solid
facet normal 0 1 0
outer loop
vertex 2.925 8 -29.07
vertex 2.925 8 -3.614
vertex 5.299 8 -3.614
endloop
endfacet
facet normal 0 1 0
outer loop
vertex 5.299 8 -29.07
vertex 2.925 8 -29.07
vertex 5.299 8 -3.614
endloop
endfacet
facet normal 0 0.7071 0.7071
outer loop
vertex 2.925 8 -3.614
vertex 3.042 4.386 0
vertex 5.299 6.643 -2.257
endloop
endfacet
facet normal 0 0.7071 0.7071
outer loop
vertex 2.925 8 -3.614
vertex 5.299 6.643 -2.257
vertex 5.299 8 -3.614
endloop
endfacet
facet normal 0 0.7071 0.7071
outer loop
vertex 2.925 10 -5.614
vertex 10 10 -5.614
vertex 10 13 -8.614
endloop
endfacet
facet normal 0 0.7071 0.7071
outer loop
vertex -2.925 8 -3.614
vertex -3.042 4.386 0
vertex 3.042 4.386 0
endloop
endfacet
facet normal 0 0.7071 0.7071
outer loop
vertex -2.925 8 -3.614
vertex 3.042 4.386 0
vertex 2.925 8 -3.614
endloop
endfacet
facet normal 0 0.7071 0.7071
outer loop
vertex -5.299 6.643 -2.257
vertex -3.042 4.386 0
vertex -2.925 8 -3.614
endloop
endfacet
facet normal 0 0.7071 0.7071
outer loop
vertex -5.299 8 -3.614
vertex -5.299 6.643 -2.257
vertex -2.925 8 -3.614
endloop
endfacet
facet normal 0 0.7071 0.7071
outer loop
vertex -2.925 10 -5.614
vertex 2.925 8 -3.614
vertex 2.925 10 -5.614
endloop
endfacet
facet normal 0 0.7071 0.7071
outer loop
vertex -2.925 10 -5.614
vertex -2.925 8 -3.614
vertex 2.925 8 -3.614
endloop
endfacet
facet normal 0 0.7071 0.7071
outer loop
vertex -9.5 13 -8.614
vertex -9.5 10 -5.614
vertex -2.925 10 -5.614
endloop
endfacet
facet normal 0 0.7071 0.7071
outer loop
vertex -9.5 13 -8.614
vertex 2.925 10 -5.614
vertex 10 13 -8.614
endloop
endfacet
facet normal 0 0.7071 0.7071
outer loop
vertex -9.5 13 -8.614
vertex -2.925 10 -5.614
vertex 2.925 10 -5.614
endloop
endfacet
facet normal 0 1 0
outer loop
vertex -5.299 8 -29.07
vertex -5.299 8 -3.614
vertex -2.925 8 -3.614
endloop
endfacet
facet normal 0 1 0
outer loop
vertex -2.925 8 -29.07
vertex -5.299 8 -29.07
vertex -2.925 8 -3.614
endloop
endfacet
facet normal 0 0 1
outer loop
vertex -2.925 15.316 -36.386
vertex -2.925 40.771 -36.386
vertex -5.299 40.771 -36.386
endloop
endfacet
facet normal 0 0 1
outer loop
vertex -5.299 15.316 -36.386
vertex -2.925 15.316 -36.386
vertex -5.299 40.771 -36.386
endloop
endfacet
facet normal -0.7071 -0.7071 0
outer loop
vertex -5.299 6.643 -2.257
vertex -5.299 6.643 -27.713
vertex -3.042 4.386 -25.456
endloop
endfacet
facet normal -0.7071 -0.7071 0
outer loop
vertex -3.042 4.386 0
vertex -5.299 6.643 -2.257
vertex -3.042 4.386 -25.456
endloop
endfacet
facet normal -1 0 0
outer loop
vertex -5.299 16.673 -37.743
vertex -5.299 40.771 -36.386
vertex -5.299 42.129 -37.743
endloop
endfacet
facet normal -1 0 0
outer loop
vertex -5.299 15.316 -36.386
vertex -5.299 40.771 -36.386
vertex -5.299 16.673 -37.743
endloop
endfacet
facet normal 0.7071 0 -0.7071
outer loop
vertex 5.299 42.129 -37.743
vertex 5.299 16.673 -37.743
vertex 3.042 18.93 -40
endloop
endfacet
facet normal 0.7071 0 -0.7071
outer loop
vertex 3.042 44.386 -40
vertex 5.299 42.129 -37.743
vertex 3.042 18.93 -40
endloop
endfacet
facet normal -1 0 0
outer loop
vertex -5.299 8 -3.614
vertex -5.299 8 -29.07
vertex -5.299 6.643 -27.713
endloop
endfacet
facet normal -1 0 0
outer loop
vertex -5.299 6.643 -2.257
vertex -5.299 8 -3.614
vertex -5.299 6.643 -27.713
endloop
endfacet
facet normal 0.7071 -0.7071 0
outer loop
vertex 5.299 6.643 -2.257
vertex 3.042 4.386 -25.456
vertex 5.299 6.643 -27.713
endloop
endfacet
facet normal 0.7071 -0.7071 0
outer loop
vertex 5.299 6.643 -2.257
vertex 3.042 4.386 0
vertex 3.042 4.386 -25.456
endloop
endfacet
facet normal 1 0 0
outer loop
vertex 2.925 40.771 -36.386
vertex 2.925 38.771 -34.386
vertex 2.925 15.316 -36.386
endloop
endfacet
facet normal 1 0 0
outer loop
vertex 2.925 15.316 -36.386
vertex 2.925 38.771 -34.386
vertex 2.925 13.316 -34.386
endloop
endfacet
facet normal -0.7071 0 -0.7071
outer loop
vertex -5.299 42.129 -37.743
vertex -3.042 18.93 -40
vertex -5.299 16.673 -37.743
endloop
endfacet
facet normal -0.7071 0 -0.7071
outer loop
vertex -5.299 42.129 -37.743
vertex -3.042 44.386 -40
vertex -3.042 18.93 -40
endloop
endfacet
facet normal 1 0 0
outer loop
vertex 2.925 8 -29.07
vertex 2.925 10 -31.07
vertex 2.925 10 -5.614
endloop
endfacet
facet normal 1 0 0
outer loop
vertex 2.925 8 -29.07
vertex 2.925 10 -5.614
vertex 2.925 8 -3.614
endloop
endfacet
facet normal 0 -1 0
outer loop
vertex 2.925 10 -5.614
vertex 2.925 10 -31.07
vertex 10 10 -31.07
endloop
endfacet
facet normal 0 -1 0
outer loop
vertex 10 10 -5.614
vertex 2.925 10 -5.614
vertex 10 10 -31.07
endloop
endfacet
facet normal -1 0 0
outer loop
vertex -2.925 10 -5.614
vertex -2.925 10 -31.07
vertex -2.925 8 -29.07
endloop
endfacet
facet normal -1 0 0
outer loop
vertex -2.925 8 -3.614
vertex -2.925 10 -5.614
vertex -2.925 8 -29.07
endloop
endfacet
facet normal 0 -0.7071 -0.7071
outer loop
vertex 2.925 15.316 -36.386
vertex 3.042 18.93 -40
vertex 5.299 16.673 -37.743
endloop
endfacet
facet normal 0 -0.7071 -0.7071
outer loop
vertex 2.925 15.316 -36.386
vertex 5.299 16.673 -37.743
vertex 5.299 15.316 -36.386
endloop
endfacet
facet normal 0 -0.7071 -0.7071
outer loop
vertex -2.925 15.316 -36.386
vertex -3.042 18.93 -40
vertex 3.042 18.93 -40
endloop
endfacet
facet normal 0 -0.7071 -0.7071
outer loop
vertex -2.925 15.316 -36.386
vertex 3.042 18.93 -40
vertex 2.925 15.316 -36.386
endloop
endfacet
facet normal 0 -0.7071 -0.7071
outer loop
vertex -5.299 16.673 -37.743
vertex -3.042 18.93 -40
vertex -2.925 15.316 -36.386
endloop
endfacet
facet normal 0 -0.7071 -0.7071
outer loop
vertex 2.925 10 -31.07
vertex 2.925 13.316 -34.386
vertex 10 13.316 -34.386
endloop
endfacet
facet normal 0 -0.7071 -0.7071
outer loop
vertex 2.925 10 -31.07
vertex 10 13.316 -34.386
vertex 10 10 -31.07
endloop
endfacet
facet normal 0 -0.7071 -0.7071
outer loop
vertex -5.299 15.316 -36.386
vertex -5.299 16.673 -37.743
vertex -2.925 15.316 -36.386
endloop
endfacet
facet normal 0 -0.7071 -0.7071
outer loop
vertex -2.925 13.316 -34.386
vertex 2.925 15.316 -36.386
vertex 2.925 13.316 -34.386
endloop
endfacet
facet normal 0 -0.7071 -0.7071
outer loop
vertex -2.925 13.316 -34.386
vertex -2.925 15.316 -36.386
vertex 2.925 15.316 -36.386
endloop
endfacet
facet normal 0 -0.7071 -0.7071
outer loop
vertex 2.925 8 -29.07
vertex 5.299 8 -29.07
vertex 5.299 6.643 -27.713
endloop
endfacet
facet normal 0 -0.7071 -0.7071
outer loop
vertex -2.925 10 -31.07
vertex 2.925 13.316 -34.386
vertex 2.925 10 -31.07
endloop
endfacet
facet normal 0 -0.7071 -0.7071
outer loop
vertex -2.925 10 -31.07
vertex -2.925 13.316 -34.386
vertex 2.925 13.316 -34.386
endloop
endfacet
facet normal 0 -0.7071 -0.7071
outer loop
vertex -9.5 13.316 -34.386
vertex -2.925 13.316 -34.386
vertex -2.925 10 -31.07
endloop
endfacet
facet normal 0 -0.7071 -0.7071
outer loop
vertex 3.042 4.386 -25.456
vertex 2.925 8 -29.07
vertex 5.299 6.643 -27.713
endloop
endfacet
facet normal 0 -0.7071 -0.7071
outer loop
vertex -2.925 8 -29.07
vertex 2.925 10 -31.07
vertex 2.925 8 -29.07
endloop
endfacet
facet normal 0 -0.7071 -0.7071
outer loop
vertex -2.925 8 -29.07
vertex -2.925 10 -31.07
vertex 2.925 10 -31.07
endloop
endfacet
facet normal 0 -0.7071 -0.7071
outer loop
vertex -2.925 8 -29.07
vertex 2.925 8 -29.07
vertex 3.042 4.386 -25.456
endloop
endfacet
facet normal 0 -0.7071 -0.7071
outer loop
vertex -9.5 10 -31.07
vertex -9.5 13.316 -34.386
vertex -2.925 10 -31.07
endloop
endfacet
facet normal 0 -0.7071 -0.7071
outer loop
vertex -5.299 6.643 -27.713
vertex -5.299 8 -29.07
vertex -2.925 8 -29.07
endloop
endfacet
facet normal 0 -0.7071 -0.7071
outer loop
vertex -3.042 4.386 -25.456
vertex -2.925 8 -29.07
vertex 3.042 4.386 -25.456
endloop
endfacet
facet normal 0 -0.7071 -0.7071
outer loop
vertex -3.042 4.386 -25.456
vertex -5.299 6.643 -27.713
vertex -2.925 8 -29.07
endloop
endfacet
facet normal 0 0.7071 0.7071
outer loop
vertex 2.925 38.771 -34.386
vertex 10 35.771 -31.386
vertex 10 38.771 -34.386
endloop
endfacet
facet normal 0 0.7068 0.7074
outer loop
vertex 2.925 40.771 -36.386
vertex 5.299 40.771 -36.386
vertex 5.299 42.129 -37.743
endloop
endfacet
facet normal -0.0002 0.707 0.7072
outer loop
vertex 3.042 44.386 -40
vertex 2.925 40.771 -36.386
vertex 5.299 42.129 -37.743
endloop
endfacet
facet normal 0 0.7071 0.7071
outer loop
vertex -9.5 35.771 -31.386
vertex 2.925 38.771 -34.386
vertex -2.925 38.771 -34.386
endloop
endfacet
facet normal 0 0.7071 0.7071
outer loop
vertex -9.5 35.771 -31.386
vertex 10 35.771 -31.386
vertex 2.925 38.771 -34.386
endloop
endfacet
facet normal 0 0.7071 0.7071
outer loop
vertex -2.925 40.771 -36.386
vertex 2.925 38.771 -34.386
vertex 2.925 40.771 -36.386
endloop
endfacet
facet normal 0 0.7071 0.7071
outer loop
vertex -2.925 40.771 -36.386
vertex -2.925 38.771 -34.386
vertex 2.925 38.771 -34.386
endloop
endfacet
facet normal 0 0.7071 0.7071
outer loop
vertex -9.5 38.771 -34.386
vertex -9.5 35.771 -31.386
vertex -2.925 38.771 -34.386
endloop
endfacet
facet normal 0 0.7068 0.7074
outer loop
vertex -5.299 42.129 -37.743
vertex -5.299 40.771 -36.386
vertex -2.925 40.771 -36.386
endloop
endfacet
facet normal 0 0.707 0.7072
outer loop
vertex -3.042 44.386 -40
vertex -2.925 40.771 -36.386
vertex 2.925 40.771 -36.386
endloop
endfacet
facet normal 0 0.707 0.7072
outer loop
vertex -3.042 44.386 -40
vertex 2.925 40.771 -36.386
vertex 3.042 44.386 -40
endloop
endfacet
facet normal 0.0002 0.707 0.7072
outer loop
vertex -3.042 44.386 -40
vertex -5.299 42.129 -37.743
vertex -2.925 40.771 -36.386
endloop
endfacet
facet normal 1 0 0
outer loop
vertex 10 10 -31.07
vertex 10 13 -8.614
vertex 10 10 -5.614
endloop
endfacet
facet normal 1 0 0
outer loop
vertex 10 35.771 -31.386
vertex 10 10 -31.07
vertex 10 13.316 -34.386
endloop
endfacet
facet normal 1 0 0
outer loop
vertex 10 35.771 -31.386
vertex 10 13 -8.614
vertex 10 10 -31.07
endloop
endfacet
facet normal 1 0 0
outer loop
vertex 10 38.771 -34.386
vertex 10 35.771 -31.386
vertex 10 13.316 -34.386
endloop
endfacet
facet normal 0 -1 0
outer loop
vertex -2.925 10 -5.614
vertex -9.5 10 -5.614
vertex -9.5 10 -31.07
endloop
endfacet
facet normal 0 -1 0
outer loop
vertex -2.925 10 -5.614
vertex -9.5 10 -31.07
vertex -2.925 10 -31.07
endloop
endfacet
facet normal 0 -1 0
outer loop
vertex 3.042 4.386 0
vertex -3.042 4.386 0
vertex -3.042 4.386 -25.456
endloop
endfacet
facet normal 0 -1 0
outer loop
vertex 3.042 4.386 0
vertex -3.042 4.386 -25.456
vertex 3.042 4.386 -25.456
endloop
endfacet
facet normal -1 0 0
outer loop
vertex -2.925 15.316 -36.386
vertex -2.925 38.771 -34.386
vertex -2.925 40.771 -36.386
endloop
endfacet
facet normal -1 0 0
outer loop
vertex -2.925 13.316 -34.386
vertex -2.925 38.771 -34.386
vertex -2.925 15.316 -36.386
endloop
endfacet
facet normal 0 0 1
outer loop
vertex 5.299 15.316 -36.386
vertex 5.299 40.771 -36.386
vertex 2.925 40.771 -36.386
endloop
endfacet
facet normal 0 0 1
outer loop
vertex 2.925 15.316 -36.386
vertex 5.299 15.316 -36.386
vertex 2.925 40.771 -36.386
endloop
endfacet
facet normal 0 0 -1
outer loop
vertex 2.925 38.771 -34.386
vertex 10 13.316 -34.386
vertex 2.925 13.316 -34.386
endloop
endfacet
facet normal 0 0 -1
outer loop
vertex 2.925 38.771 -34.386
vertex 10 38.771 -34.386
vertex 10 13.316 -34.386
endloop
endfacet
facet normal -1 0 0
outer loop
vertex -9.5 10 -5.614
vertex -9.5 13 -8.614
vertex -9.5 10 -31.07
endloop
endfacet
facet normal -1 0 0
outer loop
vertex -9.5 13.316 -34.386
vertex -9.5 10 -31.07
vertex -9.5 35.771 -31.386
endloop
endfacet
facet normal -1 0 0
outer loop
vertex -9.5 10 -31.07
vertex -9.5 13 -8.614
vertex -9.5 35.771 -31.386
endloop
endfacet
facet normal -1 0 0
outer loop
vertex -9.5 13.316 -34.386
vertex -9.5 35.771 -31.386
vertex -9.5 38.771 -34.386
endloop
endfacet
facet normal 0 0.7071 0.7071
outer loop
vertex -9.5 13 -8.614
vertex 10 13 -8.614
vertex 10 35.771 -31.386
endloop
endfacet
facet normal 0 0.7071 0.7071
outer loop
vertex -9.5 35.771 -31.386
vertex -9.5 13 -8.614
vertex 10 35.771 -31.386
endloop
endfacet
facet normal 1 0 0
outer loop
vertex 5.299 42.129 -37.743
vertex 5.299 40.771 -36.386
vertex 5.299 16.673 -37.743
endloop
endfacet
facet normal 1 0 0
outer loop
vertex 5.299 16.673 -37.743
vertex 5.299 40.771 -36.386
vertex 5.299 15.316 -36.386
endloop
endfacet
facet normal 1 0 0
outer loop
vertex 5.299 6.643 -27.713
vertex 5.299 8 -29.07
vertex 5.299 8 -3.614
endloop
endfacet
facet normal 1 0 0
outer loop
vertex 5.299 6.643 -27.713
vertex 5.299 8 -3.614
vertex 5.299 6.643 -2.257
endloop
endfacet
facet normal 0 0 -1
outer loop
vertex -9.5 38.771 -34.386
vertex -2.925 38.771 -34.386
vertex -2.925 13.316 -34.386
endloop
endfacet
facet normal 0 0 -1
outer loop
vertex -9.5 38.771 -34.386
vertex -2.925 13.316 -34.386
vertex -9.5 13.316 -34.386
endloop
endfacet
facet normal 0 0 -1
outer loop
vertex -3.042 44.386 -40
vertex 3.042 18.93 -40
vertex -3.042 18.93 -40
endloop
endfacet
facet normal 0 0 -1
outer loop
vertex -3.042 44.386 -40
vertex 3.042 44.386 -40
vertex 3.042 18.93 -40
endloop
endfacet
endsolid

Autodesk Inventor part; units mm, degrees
sketch "Szkic2" plane through (0, 0, 0) normal (0, 0, 1) x (1, 0, 0)
  circle A0 centre (0, 0) radius 2.1
  line L0 (-10, 10) -> (10, 10)
  line L1 (10, 10) -> (10, -10)
  line L2 (10, -10) -> (-10, -10)
  line L3 (-10, -10) -> (-10, 10)
  line L4 (-10, -10) -> (10, 10) construction
  line L5 (10, -10) -> (-10, 10) construction
  line L6 (-10, 8.2) -> (10, 8.2)
  line L7 (-10, -8.2) -> (10, -8.2)
  line L8 (-8.2, 10) -> (-8.2, -10)
  line L9 (10, 10) -> (30, 10)
  line L10 (30, 10) -> (30, -10)
  line L11 (30, -10) -> (10, -10)
  line L12 (10, -10) -> (10, 10)
  line L13 (-4.1857, -4.1857) -> (4.1857, -4.1857)
  line L14 (4.1857, -4.1857) -> (4.1857, 4.1857)
  line L15 (4.1857, 4.1857) -> (-4.1857, 4.1857)
  line L16 (-4.1857, 4.1857) -> (-4.1857, -4.1857)
  line L17 (-8.2, 7.1393) -> (-4.1857, 3.125)
  line L18 (-7.1393, 8.2) -> (-3.125, 4.1857)
  line L19 (-4.925, 10) -> (-3.125, 8.2)
  line L20 (4.925, 10) -> (3.125, 8.2)
  line L21 (-3.125, -8.2) -> (-4.925, -10)
  line L22 (3.125, -8.2) -> (4.925, -10)
  line L23 (-8.2, -7.1393) -> (-4.1857, -3.125)
  line L24 (-7.1393, -8.2) -> (-3.125, -4.1857)
  line L25 (3.125, -4.1857) -> (7.1393, -8.2)
  line L26 (4.1857, -3.125) -> (7.3007, -6.24)
  line L27 (4.1857, 3.125) -> (7.3007, 6.24)
  line L28 (3.125, 4.1857) -> (7.1393, 8.2)
  line L29 (-5.4993, 8.2) -> (-5.4993, 6.56)
  line L30 (5.4993, 8.2) -> (5.4993, 6.56)
  line L31 (-8.2, 5.4993) -> (-6.56, 5.4993)
  line L32 (-8.2, -5.4993) -> (-6.56, -5.4993)
  line L33 (-5.4993, -6.56) -> (-5.4993, -8.2)
  line L34 (5.4993, -6.56) -> (5.4993, -8.2)
  line L35 (-8.2, 3.125) -> (-10, 4.925)
  line L36 (-8.2, -3.125) -> (-10, -4.925)
  line L37 (7.3007, 6.24) -> (7.3007, 8.2)
  line L38 (7.3007, -6.24) -> (7.3007, -8.2)
  line L39 (15.8143, -4.1857) -> (15.8143, 4.1857)
  line L40 (24.1857, -4.1857) -> (15.8143, -4.1857)
  line L41 (23.125, -8.2) -> (24.925, -10)
  line L42 (30, -8.2) -> (10, -8.2)
  line L43 (30, 8.2) -> (10, 8.2)
  line L44 (28.2, 10) -> (28.2, -10)
  line L45 (15.8143, -3.125) -> (12.6993, -6.24)
  line L46 (27.1393, -8.2) -> (23.125, -4.1857)
  line L47 (12.6993, -6.24) -> (12.6993, -8.2)
  line L48 (16.875, -8.2) -> (15.075, -10)
  circle A1 centre (20, 0) radius 2.1
  line L49 (24.925, 10) -> (23.125, 8.2)
  line L50 (27.1393, 8.2) -> (23.125, 4.1857)
  line L51 (28.2, 7.1393) -> (24.1857, 3.125)
  line L52 (28.2, 5.4993) -> (26.56, 5.4993)
  line L53 (28.2, 3.125) -> (30, 4.925)
  line L54 (15.8143, 4.1857) -> (24.1857, 4.1857)
  line L55 (15.075, 10) -> (16.875, 8.2)
  line L56 (14.5007, 8.2) -> (14.5007, 6.56)
  line L57 (16.875, 4.1857) -> (12.8607, 8.2)
  line L58 (12.6993, 6.24) -> (12.6993, 8.2)
  line L59 (15.8143, 3.125) -> (12.6993, 6.24)
  line L60 (24.1857, 4.1857) -> (24.1857, -4.1857)
  line L61 (28.2, -7.1393) -> (24.1857, -3.125)
  line L62 (28.2, -5.4993) -> (26.56, -5.4993)
  line L63 (25.4993, -6.56) -> (25.4993, -8.2)
  line L64 (28.2, -3.125) -> (30, -4.925)
  line L65 (14.5007, -6.56) -> (14.5007, -8.2)
  line L66 (16.875, -4.1857) -> (12.8607, -8.2)
  line L67 (-13, 13) -> (33, 13)
  line L68 (33, 13) -> (33, -13)
  line L69 (33, -13) -> (-13, -13)
  line L70 (-13, -13) -> (-13, 13)
  line L71 (-10, -8.2) -> (-13, -8.2)
  line L72 (30, -8.2) -> (33, -8.2)
  line L73 (-3.125, 8.2) -> (-3.125, 10)
  line L74 (3.125, 8.2) -> (3.125, 10)
  line L75 (-8.2, 3.125) -> (-10, 3.125)
  line L76 (-8.2, -3.125) -> (-10, -3.125)
  line L77 (-3.125, -8.2) -> (-3.125, -10)
  line L78 (3.125, -8.2) -> (3.125, -10)
  line L79 (16.875, -8.2) -> (16.875, -10)
  line L80 (23.125, -8.2) -> (23.125, -10)
  line L81 (28.2, -3.125) -> (30, -3.125)
  line L82 (28.2, 3.125) -> (30, 3.125)
  line L83 (23.125, 8.2) -> (23.125, 10)
  line L84 (16.875, 8.2) -> (16.875, 10)
  line L85 (-10, 10) -> (-10, 13)
  line L86 (10, 10) -> (10, 13)
  line L87 (-5.2993, 8.2) -> (-5.2993, 6.56)
  line L88 (-6.9979, 8.3414) -> (-2.9836, 4.3271)
  line L89 (-4.3857, 4.3857) -> (4.3857, 4.3857)
  line L90 (4.3857, 4.3857) -> (4.3857, -4.3857)
  line L91 (4.3857, -4.3857) -> (-4.3857, -4.3857)
  line L92 (-4.3857, -4.3857) -> (-4.3857, 4.3857)
  line L93 (2.9836, 4.3271) -> (6.9979, 8.3414)
  line L94 (5.2993, 8.2) -> (5.2993, 6.56)
  line L95 (-10, 8) -> (10, 8)
  line L96 (10, 8) -> (30, 8)
  line L97 (2.925, 10) -> (2.925, 7.7172)
  line L98 (2.925, 7.7172) -> (5.0664, 9.8586)
  line L99 (-2.925, 10) -> (-2.925, 7.7172)
  line L100 (-2.925, 7.7172) -> (-5.0664, 9.8586)
  point P0 (0, 0)
  point P1 (0, -8.2)
  point P2 (0, 0)
  point P3 (-2.925, 8)
  point P4 (-5.2993, 8)
  point P5 (-5.2993, 6.6428)
  point P6 (-3.0422, 4.3857)
  point P7 (3.0422, 4.3857)
  point P8 (5.2993, 6.6428)
  point P9 (5.2993, 8)
  point P10 (2.925, 8)
  dimension "d2" = 4.2
  dimension "d3" = 20
  dimension "d4" = 1.8
  dimension "d5" = 20
  dimension "d6" = 20
  dimension "d7" = 1.8
  dimension "d8" = 1.8
  dimension "d9" = 1.5
  dimension "d10" = 0.75
  dimension "d11" = 135
  dimension "d12" = 6.25
  dimension "d13" = 3.125
  dimension "d14" = 1.5
  dimension "d15" = 1.5
  dimension "d16" = 1.5
  dimension "d17" = 0.75
  dimension "d18" = 0.75
  dimension "d19" = 0.75
  dimension "d20" = 1.64
  dimension "d21" = 1.64
  dimension "d22" = 1.64
  dimension "d23" = 1.64
  dimension "d24" = 1.64
  dimension "d25" = 1.64
  dimension "d26" = 45
  dimension "d27" = 1.96
  dimension "d28" = 1.96
  dimension "d29" = 3
  dimension "d30" = 3
  dimension "d31" = 3
  dimension "d32" = 3
  dimension "d49" = 0.2
  dimension "d50" = 0.2
  dimension "d51" = 0.2
  dimension "d52" = 0.2
  dimension "d53" = 0.2
  dimension "d54" = 0.2
  dimension "d55" = 0.2
  dimension "d56" = 0.2
extrude "Wyciągnięcie proste2" add sketch "Szkic2" against normal blind 40 contours L85 L67 L86 L0 | L0 L97 L6 L99 | L6 L97 L95 L99 | L100 L99 L95 L97 L98 L94 L93 L89 L88 L87 | L95 L99 L100 | L95 L98 L97
ref_plane "Płaszczyzna konstrukcyjna2" through (-4.3857, 4.3857, -40) normal (0, -0.7071, 0.7071) x (-1, 0, 0)
split "Podział1" plane through (-4.3857, 4.3857, -40) removes the side toward (0, 0.7071, -0.7071)
mirror "Odbij1" about plane through (-4.3857, 4.3857, -40) normal (0, -0.7071, 0.7071)
fillet "Zaokrąglenie1" radius 2 2 edges at (6.4625, 10, -34.3857) (-6.4625, 10, -34.3857)
sketch "Szkic7" plane through (-10, 12, -34.3857) normal (-1, 0, 0) x (0, 0, 1)
  line L0 (34.3857, -2) -> (2, -2) projected
  line L1 (34.3857, 1) -> (34.3857, -2) projected
  line L2 (34.3857, 1) -> (3, 1) projected
  arc A0 (0, 0) -> (2, -2) centre (2, 0) ccw projected
  line L3 (3, 32.3857) -> (3, 1) projected
  line L4 (3, 32.3857) -> (0, 32.3857) projected
  line L5 (0, 32.3857) -> (0, 0) projected
  point P0 (34.3857, -12)
extrude "Wyciągnięcie proste5" cut sketch "Szkic7" against normal blind 0.5
ref_plane "Płaszczyzna konstrukcyjna6" through (-4.3857, 44.3857, -40) normal (0, -0.7071, -0.7071) x (1, 0, 0)
split "Podział3" plane through (-4.3857, 44.3857, -40) removes the side toward (0, 0.7071, 0.7071)
sketch "Szkic8" plane through (10, 12, -34.3857) normal (1, 0, 0) x (0, 0, -1)
  line L0 (-25.7713, 1) -> (-28.7713, -2) projected
  line L1 (-28.7713, -2) -> (-2, -2) projected
  arc A0 (-2, -2) -> (0, 0) centre (-2, 0) ccw projected
  line L2 (0, 26.7713) -> (0, 0) projected
  line L3 (0, 26.7713) -> (-3, 23.7713) projected
  line L4 (-3, 23.7713) -> (-3, 1) projected
  line L5 (-25.7713, 1) -> (-3, 1) projected
  line L6 (-3, 23.7713) -> (-3, 1) projected
  line L7 (-25.7713, 1) -> (-3, 23.7713)
  point P0 (-34.3857, -12)
extrude "Wyciągnięcie proste6" add sketch "Szkic8" against normal up to surface (19.5 mm away) contours L7 L4 L5
fillet "Zaokrąglenie3" radius 2 1 edges at (0, 4.3857, -40)
ref_plane "Work Plane7" through (-3.0422, 31.6577, -52.7279) normal (0, 0.7071, 0.7071) x (1, 0, 0)
split "Split4" plane through (-3.0422, 31.6577, -52.7279) removes the side toward (0, -0.7071, -0.7071)
properties part number "Kątownik"
